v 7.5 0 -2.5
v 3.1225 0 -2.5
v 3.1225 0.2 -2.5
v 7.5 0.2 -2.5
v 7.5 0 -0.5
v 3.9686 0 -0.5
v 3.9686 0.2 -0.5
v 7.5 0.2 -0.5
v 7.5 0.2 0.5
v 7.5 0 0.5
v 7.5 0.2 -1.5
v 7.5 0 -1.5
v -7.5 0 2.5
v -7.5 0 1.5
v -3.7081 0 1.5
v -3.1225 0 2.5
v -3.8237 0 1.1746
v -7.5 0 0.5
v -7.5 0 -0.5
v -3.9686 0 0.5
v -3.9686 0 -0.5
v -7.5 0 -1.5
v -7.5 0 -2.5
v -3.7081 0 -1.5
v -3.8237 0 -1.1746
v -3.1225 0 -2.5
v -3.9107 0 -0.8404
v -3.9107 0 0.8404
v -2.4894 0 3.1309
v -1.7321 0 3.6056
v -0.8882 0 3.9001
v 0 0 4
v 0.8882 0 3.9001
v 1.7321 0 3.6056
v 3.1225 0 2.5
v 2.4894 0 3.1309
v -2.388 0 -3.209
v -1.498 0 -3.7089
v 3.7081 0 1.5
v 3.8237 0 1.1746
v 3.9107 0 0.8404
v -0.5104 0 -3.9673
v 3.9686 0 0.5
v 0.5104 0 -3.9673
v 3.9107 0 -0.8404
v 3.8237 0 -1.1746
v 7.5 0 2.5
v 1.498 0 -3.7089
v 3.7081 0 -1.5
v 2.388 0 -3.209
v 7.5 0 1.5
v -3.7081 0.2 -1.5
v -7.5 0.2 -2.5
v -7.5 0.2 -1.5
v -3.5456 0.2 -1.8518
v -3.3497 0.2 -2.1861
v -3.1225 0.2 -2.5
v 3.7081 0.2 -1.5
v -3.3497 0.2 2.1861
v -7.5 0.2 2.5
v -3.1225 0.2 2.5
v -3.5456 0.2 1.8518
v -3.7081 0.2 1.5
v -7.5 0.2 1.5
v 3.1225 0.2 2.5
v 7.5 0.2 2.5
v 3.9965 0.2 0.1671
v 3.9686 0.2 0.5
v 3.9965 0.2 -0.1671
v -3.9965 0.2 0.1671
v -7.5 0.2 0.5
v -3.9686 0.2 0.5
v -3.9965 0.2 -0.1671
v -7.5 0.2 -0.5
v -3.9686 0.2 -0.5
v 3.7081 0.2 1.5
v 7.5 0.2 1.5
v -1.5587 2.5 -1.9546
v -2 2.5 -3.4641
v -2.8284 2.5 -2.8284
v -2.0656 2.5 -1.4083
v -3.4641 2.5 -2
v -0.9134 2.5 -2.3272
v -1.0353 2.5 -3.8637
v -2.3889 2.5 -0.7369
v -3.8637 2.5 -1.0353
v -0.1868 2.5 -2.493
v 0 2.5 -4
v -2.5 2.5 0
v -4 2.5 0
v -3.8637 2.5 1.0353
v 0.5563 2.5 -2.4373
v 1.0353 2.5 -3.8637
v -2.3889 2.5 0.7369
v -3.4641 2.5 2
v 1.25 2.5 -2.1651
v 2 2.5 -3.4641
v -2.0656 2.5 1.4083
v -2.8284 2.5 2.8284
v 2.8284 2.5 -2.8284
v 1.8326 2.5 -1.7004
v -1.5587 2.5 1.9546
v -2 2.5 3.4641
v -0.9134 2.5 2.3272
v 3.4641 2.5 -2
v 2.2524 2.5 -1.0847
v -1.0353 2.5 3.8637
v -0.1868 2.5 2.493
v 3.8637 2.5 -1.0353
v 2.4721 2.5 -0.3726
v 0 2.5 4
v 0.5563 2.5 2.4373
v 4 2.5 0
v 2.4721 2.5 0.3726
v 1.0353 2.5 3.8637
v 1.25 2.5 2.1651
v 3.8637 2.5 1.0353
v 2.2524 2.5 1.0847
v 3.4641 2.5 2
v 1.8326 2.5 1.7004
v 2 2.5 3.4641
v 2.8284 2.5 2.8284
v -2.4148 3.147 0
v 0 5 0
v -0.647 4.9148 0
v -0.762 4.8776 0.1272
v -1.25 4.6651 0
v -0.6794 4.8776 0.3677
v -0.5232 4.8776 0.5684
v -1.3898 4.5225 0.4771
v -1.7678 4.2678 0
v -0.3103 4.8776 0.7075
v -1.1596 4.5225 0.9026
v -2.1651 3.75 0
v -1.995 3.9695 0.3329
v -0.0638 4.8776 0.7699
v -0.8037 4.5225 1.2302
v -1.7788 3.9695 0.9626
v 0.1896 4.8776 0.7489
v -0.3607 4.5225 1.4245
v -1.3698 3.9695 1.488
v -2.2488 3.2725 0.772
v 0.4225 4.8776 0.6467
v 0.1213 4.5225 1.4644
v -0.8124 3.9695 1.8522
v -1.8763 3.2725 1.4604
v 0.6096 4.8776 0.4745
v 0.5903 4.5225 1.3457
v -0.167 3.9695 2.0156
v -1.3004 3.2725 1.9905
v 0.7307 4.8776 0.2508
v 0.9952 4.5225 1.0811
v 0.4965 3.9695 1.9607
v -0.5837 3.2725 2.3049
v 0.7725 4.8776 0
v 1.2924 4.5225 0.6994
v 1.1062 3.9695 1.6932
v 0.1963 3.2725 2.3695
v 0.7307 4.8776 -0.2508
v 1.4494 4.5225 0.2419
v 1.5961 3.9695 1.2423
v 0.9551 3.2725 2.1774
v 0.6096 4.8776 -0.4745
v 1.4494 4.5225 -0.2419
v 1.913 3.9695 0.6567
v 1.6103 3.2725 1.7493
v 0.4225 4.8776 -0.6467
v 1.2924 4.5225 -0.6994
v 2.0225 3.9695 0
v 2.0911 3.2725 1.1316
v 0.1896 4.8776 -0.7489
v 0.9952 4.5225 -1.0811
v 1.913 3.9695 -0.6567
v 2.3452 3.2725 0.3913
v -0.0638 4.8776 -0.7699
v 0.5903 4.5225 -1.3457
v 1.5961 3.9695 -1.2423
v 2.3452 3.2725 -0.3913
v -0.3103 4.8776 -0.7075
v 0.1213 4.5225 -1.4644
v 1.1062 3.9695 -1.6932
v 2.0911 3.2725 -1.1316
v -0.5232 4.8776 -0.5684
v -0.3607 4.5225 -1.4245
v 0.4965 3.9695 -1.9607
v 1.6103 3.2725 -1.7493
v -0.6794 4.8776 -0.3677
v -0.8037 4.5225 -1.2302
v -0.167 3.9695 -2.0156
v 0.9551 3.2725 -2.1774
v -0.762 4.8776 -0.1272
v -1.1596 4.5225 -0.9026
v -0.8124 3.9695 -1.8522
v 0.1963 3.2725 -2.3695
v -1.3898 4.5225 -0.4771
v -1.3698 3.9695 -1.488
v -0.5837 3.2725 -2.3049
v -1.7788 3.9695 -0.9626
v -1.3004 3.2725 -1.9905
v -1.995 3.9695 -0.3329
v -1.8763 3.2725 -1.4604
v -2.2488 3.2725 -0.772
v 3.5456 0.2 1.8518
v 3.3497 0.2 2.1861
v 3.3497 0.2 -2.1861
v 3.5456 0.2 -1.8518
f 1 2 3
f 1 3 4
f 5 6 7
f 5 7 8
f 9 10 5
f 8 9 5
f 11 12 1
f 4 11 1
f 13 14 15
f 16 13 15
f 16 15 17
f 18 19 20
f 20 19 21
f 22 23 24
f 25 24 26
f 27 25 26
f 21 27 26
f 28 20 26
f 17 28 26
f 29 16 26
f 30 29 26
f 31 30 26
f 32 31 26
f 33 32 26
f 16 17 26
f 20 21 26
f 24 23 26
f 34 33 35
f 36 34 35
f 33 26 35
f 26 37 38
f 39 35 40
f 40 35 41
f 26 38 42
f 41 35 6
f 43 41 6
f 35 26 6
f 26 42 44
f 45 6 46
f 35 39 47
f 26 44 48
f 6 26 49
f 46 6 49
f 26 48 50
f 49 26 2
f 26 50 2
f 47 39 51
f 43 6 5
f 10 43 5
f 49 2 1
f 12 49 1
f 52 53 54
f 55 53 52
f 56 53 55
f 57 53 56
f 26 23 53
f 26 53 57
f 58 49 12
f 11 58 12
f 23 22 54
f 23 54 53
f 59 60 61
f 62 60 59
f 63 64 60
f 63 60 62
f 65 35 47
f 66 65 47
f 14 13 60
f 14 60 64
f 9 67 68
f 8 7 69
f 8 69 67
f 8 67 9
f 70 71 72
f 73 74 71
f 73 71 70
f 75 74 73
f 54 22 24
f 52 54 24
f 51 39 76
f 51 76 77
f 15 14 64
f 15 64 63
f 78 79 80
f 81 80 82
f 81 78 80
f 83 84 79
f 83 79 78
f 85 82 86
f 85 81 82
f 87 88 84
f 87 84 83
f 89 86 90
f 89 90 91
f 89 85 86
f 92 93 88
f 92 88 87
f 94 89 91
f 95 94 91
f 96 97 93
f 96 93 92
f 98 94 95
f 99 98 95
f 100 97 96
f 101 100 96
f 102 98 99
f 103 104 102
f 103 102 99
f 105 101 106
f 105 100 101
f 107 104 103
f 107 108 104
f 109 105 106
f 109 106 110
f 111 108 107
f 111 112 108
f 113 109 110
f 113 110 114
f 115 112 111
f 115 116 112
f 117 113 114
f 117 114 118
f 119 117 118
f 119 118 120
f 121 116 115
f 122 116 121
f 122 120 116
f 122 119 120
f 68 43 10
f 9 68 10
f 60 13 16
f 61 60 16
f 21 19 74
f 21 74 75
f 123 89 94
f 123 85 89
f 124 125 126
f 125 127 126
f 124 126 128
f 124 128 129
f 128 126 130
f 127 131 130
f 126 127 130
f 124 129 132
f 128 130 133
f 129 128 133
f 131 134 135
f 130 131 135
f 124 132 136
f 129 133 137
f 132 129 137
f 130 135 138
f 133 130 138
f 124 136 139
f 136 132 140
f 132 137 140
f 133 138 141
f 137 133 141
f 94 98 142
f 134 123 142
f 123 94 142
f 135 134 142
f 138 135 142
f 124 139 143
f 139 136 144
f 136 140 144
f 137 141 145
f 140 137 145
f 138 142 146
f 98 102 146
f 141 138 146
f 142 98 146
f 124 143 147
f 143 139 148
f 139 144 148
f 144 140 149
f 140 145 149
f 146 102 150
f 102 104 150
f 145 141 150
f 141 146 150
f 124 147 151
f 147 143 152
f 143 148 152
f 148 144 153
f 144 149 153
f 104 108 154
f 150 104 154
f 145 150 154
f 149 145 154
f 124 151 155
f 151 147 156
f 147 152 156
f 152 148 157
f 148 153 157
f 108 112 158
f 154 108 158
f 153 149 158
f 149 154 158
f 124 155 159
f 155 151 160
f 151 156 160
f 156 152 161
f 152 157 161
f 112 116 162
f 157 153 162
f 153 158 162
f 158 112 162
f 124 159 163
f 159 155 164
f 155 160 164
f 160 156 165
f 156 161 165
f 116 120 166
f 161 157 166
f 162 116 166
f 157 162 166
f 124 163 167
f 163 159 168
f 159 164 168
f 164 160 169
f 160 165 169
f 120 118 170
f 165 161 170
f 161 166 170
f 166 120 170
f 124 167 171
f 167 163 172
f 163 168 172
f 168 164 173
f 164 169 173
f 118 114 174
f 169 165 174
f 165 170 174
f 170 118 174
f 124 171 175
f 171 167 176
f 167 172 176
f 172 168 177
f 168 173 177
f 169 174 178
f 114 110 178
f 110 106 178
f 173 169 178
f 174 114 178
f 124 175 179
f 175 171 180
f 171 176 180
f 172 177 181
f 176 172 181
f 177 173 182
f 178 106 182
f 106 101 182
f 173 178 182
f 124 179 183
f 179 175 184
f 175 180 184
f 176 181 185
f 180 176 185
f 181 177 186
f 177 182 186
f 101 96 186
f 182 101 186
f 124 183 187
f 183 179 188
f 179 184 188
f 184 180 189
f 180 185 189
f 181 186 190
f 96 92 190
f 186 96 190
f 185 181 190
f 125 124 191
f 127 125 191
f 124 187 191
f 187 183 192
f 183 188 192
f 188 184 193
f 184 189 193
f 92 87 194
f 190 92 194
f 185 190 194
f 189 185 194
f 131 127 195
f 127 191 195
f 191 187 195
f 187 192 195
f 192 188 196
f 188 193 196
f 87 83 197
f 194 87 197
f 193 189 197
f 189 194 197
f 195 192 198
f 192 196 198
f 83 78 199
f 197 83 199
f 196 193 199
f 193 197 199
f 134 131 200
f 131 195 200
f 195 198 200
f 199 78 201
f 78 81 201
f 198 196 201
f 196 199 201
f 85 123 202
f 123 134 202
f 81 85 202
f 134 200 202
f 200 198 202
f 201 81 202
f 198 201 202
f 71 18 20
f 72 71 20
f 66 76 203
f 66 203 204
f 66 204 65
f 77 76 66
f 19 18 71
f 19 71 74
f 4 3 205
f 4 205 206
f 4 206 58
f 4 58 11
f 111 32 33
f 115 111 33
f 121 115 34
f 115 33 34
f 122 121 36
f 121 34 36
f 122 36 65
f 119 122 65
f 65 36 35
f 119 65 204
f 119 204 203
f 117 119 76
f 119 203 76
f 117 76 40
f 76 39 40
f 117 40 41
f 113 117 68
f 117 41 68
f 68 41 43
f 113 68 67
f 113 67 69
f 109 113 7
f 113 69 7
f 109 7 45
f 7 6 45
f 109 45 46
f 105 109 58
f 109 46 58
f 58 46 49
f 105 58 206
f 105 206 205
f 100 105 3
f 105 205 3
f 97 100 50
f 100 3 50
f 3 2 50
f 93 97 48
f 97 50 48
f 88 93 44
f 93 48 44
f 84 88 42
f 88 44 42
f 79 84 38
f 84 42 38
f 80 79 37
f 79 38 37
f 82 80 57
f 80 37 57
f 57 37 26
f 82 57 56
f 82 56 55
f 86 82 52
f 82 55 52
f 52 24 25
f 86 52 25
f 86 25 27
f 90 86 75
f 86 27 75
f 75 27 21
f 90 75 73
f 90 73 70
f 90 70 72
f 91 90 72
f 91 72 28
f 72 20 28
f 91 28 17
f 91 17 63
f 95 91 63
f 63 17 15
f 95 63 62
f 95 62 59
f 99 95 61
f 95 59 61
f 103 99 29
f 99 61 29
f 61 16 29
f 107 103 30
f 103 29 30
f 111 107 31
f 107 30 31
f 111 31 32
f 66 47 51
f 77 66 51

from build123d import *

# Parameters (mm, degrees)
SKETCH_1_R      = 4
EXTRUDE_1_DEPTH = 2.5
SKETCH_3_W      = 15
SKETCH_3_H      = 1
EXTRUDE_2_DEPTH = 0.2


with BuildPart() as part:
    # Эскиз1 → Бобышка-Вытянуть1 (new body)
    with BuildSketch(Plane(origin=(0, 0, 0), x_dir=(1, 0, 0), z_dir=(0, 1, 0))):
        with Locations(Location((0, 0, 0), (0, 0, 270))):
            Circle(SKETCH_1_R)
    extrude(amount=EXTRUDE_1_DEPTH)

    # Эскиз2 → Повернуть1 (revolve)
    with BuildSketch(Plane.XY):
        with BuildLine():
            Line((-2.5, 2.5), (0, 2.5))
            Line((0, 2.5), (0, 5))
            ThreePointArc((0, 5), (-1.767766953, 4.267766953), (-2.5, 2.5))
        make_face()
    revolve(axis=Axis((0, 0, 0), (0, 1, 0)))

    # Эскиз3 → Бобышка-Вытянуть2 (add)
    with BuildSketch(Plane(origin=(0, 0, 0), x_dir=(1, 0, 0), z_dir=(0, 1, 0))):
        with Locations((0, 2)):
            Rectangle(SKETCH_3_W, SKETCH_3_H)
        Rectangle(SKETCH_3_W, SKETCH_3_H)
        with Locations((0, -2)):
            Rectangle(SKETCH_3_W, SKETCH_3_H)
    extrude(amount=EXTRUDE_2_DEPTH)


solid = part.part
